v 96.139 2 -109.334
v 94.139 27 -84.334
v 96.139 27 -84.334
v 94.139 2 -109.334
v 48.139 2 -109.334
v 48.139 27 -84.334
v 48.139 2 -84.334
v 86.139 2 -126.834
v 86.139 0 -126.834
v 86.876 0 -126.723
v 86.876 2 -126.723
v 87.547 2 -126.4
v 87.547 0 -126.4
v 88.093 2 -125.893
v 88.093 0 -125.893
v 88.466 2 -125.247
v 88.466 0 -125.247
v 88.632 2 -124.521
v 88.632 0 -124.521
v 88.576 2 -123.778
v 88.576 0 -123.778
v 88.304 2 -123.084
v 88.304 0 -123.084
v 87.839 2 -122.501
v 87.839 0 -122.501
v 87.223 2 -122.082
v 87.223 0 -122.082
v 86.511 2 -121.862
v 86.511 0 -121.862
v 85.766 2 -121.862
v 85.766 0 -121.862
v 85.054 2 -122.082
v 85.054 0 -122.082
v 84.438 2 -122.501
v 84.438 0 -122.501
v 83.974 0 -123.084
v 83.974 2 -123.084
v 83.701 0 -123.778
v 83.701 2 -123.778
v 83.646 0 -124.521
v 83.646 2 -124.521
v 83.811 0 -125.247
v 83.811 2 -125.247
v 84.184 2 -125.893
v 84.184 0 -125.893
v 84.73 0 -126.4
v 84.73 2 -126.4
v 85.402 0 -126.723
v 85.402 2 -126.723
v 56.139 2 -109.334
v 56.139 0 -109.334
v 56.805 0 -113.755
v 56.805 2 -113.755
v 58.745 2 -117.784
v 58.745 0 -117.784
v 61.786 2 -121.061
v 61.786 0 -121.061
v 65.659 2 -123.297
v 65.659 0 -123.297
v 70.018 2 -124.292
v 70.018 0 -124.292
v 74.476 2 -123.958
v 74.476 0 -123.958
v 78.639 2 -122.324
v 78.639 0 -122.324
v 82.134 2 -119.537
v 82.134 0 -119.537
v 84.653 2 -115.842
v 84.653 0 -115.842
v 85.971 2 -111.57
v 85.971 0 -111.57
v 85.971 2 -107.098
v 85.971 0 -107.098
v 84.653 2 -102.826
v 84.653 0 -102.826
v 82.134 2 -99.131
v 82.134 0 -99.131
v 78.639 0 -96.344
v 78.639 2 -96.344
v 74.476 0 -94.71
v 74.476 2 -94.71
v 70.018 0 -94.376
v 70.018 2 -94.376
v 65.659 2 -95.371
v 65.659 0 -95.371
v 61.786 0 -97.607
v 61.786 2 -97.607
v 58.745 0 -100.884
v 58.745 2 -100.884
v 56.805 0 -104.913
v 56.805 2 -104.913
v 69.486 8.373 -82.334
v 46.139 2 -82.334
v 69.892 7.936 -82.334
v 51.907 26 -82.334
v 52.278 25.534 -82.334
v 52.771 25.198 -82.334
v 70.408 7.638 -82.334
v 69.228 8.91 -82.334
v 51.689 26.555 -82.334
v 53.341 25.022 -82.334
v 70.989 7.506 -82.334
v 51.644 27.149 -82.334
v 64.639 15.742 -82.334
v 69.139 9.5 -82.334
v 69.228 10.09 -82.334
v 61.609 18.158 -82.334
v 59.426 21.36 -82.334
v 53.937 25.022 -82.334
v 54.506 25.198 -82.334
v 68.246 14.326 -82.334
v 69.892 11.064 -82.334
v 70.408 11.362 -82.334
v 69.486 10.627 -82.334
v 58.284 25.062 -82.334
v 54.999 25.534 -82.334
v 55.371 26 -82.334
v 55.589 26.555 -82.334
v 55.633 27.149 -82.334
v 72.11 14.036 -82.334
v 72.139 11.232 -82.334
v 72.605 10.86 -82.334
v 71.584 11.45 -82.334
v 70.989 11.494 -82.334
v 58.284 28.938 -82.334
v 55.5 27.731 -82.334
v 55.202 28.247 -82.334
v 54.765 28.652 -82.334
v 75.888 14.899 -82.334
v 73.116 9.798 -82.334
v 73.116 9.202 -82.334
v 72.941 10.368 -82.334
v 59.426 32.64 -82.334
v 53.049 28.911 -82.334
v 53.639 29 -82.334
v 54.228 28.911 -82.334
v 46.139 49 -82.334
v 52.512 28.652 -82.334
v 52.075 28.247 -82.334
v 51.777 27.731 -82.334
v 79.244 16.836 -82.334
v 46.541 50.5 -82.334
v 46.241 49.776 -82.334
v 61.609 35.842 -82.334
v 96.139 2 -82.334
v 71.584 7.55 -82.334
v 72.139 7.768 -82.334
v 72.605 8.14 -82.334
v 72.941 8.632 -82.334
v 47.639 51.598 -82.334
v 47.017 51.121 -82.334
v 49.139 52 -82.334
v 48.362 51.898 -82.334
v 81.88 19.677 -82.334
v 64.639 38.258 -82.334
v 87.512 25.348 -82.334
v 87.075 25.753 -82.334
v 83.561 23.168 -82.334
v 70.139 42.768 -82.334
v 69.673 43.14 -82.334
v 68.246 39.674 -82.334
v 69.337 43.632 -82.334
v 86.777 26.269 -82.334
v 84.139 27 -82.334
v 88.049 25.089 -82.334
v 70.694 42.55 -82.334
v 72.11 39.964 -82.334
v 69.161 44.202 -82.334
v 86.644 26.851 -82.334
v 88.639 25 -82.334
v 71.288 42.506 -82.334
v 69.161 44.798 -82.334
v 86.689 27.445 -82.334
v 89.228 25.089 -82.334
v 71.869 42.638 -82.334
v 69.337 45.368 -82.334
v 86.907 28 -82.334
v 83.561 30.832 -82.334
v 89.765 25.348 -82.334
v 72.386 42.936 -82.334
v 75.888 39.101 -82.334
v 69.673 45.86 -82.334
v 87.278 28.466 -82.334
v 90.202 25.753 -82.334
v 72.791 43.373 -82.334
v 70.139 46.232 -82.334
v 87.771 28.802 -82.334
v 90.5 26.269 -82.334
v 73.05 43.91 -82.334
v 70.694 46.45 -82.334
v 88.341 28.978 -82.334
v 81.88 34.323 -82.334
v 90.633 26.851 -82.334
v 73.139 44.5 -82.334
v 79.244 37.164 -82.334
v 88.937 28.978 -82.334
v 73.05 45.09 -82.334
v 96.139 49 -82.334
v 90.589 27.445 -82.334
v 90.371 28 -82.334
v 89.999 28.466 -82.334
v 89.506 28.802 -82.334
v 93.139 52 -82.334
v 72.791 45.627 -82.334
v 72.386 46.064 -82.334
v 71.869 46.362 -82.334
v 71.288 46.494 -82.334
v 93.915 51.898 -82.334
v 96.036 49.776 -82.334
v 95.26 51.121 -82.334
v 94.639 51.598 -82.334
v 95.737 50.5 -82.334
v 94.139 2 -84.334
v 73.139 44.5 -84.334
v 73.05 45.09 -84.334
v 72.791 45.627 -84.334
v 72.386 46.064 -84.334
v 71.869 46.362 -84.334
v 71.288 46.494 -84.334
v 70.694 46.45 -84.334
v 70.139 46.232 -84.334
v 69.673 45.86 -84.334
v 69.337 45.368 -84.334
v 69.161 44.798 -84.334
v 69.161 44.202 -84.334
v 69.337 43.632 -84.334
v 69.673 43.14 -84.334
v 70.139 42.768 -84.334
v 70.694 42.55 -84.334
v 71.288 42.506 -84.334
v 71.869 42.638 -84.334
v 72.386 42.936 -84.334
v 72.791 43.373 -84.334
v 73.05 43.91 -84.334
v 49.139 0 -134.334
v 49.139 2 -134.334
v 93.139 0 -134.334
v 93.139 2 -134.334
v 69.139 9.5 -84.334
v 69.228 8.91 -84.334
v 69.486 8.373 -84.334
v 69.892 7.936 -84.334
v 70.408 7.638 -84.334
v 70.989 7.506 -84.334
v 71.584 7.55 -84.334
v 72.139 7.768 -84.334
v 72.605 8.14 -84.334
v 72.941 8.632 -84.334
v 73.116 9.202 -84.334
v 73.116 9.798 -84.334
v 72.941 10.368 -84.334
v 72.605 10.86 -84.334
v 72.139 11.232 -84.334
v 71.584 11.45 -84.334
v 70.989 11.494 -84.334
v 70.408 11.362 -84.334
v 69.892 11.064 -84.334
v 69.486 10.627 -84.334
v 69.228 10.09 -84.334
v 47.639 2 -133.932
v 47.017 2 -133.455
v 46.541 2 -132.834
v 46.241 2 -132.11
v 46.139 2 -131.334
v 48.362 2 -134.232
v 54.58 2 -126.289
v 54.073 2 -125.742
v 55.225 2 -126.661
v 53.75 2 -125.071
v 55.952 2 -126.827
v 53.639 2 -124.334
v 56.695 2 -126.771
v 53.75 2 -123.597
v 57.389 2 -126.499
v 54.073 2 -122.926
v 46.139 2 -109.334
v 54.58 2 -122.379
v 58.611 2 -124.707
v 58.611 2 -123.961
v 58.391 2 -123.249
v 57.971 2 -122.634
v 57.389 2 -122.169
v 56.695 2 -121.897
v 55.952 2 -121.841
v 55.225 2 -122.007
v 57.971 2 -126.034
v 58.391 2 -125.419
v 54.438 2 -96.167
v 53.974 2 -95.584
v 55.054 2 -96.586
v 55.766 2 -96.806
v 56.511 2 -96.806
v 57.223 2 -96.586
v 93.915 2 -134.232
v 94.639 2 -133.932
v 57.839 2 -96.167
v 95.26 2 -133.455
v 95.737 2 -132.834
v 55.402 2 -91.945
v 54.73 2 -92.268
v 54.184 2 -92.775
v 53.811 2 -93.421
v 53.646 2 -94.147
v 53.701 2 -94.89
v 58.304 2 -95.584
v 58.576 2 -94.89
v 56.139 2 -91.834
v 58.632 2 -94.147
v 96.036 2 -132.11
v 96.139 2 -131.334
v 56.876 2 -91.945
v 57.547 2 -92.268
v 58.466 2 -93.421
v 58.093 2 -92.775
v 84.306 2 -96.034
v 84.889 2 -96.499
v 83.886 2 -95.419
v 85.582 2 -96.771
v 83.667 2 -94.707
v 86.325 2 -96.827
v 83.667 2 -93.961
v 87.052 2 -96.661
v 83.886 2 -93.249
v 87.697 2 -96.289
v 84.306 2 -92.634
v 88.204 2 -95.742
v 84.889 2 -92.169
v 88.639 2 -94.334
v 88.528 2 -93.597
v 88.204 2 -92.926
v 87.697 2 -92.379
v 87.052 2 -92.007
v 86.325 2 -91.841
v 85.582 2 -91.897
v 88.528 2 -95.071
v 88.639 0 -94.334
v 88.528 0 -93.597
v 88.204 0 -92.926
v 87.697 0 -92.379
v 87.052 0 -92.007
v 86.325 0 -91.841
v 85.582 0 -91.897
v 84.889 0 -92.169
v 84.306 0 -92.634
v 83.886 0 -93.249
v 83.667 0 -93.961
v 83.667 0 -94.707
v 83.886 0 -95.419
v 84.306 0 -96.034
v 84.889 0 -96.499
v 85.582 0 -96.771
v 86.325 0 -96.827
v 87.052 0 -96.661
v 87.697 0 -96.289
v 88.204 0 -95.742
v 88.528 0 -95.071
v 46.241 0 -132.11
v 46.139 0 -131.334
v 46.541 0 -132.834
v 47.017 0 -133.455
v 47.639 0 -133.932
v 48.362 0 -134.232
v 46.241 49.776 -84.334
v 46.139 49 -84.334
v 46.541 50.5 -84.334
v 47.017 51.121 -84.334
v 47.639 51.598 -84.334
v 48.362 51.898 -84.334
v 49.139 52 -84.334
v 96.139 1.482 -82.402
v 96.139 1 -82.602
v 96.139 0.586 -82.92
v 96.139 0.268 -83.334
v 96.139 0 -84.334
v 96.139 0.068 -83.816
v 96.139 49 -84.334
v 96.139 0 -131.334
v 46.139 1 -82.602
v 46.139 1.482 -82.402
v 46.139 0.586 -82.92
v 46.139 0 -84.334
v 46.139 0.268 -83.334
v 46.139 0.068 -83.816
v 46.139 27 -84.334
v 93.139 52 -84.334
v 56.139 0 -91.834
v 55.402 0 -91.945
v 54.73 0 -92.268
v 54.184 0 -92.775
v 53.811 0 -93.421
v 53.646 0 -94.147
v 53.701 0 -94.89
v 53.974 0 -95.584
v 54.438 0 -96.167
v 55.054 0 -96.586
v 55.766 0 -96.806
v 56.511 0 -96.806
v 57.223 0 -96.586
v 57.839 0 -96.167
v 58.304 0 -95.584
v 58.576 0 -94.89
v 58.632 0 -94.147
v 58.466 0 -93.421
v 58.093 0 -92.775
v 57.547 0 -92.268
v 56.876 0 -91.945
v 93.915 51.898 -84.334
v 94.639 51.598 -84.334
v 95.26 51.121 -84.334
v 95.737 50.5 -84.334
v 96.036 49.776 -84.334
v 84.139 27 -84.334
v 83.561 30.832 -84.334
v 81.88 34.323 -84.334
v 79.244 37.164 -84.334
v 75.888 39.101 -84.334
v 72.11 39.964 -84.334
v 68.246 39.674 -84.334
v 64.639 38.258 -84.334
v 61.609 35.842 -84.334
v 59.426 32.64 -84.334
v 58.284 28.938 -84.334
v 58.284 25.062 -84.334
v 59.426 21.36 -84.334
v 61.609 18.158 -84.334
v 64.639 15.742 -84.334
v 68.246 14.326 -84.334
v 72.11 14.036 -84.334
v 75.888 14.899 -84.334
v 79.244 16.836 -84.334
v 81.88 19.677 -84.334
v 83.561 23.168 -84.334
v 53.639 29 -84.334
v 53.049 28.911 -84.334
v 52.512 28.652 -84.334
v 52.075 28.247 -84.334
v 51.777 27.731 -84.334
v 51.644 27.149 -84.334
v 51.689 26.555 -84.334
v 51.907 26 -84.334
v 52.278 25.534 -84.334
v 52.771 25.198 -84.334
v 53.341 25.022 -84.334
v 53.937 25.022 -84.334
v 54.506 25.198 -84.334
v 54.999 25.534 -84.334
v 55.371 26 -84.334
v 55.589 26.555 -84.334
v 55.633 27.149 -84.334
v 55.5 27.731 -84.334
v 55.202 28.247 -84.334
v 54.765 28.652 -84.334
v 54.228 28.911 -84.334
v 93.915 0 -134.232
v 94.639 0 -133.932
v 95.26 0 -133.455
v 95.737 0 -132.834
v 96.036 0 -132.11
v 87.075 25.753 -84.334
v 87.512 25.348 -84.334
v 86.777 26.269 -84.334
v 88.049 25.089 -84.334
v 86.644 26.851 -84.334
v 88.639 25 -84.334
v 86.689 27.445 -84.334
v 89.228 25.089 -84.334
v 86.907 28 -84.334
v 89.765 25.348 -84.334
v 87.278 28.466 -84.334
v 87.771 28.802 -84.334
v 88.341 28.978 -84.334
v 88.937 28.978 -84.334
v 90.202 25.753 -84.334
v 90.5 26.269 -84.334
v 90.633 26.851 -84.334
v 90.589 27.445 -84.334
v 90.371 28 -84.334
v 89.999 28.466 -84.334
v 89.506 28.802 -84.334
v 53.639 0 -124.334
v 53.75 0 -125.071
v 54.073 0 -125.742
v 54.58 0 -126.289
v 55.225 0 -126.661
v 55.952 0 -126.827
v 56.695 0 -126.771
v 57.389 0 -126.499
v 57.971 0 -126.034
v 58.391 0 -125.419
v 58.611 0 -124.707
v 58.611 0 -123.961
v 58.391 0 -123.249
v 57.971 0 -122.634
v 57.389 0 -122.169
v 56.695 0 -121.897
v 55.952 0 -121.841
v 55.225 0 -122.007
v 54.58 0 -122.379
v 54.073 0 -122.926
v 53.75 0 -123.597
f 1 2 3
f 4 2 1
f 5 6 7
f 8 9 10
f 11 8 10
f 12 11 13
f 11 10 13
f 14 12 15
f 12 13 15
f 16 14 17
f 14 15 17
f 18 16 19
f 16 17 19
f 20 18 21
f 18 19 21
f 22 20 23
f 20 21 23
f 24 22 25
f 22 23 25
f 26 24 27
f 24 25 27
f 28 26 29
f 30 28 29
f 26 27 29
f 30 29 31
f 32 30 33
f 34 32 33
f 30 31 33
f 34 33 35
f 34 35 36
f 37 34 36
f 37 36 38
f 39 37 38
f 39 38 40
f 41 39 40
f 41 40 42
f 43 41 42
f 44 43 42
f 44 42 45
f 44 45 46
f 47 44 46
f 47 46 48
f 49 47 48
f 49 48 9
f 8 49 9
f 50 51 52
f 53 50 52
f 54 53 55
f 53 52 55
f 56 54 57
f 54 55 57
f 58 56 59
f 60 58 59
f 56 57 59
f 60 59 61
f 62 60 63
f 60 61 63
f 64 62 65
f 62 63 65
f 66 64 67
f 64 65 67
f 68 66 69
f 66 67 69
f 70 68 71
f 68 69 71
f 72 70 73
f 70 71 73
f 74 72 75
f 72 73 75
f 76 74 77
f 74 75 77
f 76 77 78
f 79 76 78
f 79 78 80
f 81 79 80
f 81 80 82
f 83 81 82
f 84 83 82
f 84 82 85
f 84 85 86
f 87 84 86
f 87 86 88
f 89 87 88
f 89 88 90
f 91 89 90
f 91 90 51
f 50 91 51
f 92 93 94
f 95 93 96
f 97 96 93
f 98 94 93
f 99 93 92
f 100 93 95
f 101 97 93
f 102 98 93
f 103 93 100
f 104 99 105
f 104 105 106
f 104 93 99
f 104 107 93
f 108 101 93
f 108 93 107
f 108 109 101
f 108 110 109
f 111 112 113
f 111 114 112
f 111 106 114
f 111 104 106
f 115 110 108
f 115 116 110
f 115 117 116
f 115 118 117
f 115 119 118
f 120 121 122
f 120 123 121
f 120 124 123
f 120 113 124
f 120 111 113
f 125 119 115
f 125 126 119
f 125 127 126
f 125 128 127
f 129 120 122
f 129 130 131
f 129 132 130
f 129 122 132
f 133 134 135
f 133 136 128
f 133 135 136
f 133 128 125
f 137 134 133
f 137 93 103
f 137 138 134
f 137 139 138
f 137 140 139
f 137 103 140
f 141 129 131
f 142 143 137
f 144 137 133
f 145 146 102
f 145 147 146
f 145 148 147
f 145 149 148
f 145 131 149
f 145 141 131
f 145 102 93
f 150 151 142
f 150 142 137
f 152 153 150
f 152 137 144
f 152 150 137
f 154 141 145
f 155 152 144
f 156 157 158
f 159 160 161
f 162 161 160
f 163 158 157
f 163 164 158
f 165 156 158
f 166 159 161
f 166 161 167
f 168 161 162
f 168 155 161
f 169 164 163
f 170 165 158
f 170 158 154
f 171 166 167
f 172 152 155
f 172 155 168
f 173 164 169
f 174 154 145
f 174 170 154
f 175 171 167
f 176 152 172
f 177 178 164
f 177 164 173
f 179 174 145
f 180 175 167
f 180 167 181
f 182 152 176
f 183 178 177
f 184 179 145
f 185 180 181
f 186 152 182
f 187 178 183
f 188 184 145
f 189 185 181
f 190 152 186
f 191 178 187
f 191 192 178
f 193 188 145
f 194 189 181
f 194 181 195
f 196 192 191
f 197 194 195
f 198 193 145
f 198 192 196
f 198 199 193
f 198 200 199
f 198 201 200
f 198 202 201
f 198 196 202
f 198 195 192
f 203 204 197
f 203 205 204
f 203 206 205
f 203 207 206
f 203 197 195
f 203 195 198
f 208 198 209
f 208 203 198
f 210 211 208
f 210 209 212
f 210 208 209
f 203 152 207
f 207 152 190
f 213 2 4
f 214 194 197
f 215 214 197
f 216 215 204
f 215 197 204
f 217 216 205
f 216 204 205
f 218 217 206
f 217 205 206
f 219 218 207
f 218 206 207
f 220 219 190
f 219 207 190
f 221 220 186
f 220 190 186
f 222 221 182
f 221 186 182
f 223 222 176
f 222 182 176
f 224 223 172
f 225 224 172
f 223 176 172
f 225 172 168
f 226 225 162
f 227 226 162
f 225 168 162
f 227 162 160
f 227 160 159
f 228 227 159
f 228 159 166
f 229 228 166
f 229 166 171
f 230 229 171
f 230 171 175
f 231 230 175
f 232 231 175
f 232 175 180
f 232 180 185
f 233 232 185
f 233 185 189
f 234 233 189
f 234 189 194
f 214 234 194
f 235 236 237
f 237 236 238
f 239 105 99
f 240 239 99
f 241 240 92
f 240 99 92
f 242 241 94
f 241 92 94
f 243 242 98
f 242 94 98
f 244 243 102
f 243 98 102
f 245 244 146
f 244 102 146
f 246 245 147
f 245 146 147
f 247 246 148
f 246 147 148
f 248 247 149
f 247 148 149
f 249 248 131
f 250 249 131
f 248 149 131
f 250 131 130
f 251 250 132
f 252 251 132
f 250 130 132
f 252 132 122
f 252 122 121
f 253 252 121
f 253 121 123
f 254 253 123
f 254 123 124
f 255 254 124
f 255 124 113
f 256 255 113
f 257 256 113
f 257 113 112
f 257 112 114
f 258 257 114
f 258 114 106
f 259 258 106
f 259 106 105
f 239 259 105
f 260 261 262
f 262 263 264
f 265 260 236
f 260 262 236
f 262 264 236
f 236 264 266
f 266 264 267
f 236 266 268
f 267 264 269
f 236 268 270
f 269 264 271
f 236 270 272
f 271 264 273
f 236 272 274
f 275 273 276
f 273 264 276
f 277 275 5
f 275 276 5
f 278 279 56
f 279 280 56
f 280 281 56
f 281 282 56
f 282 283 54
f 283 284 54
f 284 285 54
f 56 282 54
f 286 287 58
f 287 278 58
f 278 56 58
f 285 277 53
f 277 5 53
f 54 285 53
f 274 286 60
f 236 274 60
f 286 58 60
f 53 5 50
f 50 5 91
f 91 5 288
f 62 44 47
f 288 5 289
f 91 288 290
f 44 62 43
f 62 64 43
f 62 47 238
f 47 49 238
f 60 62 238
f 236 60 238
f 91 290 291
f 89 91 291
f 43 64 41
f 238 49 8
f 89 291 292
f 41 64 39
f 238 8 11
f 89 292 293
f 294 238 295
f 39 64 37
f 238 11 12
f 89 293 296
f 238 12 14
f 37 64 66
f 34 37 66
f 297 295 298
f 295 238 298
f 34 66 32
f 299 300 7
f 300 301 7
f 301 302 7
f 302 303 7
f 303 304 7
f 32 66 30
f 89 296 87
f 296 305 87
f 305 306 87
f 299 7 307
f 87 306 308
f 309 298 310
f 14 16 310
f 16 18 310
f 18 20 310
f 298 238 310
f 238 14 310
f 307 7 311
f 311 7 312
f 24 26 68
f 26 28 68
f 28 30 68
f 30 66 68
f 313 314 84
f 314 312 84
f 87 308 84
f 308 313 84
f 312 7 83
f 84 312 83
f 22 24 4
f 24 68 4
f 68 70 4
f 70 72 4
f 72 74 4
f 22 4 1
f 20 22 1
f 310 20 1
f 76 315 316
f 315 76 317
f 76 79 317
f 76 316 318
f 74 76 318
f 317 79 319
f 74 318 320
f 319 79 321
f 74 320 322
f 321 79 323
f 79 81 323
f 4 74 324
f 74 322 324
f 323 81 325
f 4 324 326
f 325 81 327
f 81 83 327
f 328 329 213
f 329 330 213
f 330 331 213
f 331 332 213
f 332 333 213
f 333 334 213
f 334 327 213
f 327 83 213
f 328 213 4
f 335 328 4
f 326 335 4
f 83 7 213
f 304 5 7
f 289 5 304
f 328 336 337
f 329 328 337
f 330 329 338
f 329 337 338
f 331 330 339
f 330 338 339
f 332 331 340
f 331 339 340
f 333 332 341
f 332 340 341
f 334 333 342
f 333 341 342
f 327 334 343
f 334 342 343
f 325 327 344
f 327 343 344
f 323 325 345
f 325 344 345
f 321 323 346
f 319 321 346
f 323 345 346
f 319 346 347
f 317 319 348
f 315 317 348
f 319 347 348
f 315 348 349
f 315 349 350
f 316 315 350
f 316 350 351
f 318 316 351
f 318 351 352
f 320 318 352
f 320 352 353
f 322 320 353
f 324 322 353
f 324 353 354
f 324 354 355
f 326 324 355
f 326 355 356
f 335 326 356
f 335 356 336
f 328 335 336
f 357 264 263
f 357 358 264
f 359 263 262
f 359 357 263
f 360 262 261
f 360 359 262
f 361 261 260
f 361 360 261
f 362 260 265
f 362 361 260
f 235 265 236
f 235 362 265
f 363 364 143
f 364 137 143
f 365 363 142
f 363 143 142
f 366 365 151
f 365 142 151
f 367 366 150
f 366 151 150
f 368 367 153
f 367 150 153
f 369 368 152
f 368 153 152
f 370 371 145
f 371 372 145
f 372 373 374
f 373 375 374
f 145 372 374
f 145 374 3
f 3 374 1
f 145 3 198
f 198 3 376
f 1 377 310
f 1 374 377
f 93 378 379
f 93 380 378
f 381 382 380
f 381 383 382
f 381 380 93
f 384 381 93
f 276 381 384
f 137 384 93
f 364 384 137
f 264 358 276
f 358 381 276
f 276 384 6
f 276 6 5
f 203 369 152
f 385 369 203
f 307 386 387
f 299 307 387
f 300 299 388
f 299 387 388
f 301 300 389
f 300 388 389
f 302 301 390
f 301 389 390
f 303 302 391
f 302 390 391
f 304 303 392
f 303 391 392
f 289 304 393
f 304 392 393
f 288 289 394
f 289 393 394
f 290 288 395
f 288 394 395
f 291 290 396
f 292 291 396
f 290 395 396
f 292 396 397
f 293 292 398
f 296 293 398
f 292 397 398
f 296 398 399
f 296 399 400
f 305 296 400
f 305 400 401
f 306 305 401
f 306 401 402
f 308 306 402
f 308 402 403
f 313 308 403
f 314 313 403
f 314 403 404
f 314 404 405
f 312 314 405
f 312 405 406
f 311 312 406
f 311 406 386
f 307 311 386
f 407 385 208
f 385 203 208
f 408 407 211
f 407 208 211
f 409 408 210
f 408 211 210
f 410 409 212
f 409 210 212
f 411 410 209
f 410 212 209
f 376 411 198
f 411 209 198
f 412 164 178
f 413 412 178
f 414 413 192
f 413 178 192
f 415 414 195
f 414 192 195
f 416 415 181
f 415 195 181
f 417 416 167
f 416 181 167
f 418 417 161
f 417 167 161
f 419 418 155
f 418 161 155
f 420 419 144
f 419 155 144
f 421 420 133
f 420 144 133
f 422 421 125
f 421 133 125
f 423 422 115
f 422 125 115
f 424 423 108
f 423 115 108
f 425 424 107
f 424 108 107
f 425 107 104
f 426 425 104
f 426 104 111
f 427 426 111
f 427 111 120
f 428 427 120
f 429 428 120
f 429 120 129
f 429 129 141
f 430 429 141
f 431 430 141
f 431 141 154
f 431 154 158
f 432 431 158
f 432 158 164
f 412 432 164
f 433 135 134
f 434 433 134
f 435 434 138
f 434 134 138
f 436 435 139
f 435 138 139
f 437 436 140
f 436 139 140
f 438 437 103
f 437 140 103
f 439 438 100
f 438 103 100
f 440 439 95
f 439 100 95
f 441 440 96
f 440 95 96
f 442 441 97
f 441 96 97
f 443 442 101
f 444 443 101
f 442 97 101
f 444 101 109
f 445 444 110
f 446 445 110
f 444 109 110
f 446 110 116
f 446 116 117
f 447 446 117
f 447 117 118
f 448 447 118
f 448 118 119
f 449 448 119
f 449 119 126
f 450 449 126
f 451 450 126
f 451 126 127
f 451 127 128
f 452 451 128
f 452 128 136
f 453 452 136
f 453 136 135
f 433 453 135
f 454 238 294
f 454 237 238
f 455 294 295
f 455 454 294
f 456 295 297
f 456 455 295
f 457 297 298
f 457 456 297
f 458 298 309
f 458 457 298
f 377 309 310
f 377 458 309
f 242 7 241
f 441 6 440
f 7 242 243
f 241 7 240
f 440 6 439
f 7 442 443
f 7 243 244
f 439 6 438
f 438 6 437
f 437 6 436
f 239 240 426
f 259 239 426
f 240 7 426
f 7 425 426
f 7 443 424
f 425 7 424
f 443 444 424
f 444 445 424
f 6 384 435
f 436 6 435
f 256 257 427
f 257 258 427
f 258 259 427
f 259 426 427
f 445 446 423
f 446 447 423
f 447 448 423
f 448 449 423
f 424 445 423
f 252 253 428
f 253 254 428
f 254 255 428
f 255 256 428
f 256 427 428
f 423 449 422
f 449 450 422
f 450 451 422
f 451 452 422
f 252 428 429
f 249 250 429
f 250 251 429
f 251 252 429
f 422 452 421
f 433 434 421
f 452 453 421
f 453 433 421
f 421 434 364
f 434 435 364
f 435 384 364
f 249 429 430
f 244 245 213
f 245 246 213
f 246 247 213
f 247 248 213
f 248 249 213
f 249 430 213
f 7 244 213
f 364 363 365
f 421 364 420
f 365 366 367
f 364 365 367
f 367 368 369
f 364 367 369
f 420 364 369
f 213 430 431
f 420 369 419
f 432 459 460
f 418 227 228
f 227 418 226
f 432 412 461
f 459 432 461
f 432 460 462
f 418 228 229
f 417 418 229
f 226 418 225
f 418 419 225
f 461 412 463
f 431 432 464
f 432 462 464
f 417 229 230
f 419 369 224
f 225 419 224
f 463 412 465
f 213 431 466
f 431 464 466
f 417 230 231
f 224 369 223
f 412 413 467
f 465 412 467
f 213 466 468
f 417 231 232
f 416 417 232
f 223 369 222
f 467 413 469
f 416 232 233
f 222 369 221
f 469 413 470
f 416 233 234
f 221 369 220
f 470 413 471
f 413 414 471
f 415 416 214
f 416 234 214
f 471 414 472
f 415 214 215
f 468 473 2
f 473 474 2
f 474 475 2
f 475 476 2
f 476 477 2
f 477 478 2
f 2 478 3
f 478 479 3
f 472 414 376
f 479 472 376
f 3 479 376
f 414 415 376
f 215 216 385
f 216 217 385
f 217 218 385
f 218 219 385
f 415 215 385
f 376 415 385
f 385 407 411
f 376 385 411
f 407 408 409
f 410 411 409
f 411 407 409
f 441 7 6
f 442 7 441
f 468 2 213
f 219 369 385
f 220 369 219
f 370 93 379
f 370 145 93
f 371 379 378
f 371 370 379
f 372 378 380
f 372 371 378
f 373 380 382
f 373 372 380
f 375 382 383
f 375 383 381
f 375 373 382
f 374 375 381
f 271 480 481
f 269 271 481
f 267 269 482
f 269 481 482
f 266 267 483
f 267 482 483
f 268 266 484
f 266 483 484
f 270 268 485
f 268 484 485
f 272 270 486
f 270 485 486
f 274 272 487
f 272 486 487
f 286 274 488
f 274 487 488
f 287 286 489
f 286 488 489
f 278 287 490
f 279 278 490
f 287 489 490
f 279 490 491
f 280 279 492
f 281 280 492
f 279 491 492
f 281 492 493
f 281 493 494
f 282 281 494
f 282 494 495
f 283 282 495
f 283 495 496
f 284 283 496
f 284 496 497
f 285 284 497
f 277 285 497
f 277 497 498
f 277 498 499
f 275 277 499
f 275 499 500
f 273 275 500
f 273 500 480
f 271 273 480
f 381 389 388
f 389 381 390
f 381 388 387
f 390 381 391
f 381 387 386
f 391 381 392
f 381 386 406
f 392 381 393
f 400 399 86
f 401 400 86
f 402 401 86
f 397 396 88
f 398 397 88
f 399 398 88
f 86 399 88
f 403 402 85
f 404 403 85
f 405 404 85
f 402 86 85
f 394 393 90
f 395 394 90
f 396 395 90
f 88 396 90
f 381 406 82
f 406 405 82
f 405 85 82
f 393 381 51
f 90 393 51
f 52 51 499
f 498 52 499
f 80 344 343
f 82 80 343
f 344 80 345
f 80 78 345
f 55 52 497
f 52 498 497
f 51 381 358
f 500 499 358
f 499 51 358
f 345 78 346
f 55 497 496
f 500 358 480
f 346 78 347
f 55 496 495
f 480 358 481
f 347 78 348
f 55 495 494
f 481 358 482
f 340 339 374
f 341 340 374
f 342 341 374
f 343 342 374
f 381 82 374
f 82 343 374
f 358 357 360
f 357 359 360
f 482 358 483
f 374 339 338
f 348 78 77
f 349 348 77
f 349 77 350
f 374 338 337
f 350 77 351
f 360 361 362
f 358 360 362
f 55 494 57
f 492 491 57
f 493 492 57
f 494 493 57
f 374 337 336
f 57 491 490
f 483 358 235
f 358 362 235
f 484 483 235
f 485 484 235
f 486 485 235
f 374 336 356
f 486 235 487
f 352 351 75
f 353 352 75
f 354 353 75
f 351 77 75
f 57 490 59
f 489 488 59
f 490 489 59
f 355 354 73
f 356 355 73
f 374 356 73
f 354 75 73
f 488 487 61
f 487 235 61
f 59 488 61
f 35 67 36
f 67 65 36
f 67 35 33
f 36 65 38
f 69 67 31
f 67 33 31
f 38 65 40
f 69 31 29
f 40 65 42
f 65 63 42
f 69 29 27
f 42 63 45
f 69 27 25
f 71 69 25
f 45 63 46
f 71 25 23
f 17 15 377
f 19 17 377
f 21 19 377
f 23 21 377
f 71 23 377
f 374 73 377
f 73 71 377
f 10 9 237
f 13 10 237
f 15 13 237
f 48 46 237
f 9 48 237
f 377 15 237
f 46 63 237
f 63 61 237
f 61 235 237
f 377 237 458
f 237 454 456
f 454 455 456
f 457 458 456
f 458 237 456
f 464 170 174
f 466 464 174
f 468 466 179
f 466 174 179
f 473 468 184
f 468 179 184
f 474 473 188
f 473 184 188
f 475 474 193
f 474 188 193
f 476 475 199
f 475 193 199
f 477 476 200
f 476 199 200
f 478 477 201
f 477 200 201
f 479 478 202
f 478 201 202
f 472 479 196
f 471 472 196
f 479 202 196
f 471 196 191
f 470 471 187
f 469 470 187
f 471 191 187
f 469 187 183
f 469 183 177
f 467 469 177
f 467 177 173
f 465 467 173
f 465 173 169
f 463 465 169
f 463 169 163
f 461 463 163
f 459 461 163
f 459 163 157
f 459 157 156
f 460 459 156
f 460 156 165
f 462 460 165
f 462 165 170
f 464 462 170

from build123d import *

# Parameters (mm, degrees)
EXTRUDE_1_DEPTH          = 50
SKETCH_2_W               = 50
SKETCH_2_H               = 50
EXTRUDE_2_DEPTH          = 2
CUT_EXTRUDE_1_DEPTH      = 46
SKETCH_4_W               = 50
SKETCH_4_H               = 52
EXTRUDE_3_DEPTH          = 2
HOLE_WIZARD_M22_1_D      = 26
HOLE_WIZARD_4_0_4_1_D    = 4
HOLE_WIZARD_M27_1_D      = 30
HOLE_WIZARD_5_0_5_1_D    = 5
FILLET_1_R               = 2
FILLET_2_R               = 3
PATTERN_CIRCULAR_1_COUNT = 4
PATTERN_CIRCULAR_2_COUNT = 4


with BuildPart() as part:
    # 草图1 → 凸台-拉伸1 (new body)
    with BuildSketch(Plane(origin=(46.138674094, 0, 0), x_dir=(0, -1, 0), z_dir=(-1, 0, 0))):
        Polygon((-27, -84.333988555), (-2, -109.333988555), (-2, -84.333988555), align=None)
    extrude(amount=-EXTRUDE_1_DEPTH)

    # 草图2 → 凸台-拉伸2 (add)
    with BuildSketch(Plane.XZ.offset(-2)):
        with Locations((71.138674094, -109.333988555)):
            Rectangle(SKETCH_2_W, SKETCH_2_H)
    extrude(amount=EXTRUDE_2_DEPTH)

    # 草图3 → 切除-拉伸1 (cut)
    with BuildSketch(Plane(origin=(48.138674094, 0, 0), x_dir=(0, -1, 0), z_dir=(-1, 0, 0))):
        Polygon((-2, -84.333988555), (-27, -84.333988555), (-2, -109.333988555), align=None)
    extrude(amount=-CUT_EXTRUDE_1_DEPTH, mode=Mode.SUBTRACT)

    # 草图4 → 凸台-拉伸3 (add)
    with BuildSketch(Plane.XY.offset(-84.333988555)):
        with Locations((71.138674094, 26)):
            Rectangle(SKETCH_4_W, SKETCH_4_H)
    extrude(amount=EXTRUDE_3_DEPTH)

    # M22 间隙孔1 (through all)
    with Locations(Plane(origin=(0, 0, -84.333988555), x_dir=(-1, 0, 0), z_dir=(0, 0, -1))):
        with Locations((-71.138674094, 27)):
            Hole(HOLE_WIZARD_M22_1_D / 2)

    # Ø4.0 (4) 直径孔1 (through all)
    with Locations(Plane(origin=(0, 0, -84.333988555), x_dir=(-1, 0, 0), z_dir=(0, 0, -1))):
        with Locations((-71.138674094, 44.5)):
            hole_wizard_4_0_4_1 = Hole(HOLE_WIZARD_4_0_4_1_D / 2)

    # M27 间隙孔1 (through all)
    with Locations(Plane(origin=(0, 2, 0), x_dir=(1, 0, 0), z_dir=(0, 1, 0))):
        with Locations((71.138674094, 109.333988555)):
            Hole(HOLE_WIZARD_M27_1_D / 2)

    # Ø5.0 (5) 直径孔1 (through all)
    with Locations(Plane(origin=(0, 2, 0), x_dir=(1, 0, 0), z_dir=(0, 1, 0))):
        with Locations((56.138674094, 124.333988555)):
            hole_wizard_5_0_5_1 = Hole(HOLE_WIZARD_5_0_5_1_D / 2)

    # 圆角1
    fillet_1_edges = [part.edges().sort_by_distance(p)[0] for p in [
        (71.138674094, 0, -82.333988555),
    ]]
    fillet(fillet_1_edges, radius=FILLET_1_R)

    # 圆角2
    fillet_2_edges = [part.edges().sort_by_distance(p)[0] for p in [
        (96.138674094, 52, -83.333988555),
        (96.138674094, 1, -134.333988555),
        (46.138674094, 52, -83.333988555),
        (46.138674094, 1, -134.333988555),
    ]]
    fillet(fillet_2_edges, radius=FILLET_2_R)

    # 阵列(圆周)1: Ø5.0 (5) 直径孔1 ×4 about axis
    pattern_circular_1_axis = Axis((71.138674094, 0, -109.333988555), (0, 1, 0))
    for i in range(1, PATTERN_CIRCULAR_1_COUNT):
        add(hole_wizard_5_0_5_1.rotate(pattern_circular_1_axis, i * 360 / PATTERN_CIRCULAR_1_COUNT), mode=Mode.SUBTRACT)

    # 阵列(圆周)2: Ø4.0 (4) 直径孔1 ×4 about axis
    pattern_circular_2_axis = Axis((71.138674094, 27, 0), (0, 0, 1))
    for i in range(1, PATTERN_CIRCULAR_2_COUNT):
        add(hole_wizard_4_0_4_1.rotate(pattern_circular_2_axis, i * 360 / PATTERN_CIRCULAR_2_COUNT), mode=Mode.SUBTRACT)


solid = part.part
